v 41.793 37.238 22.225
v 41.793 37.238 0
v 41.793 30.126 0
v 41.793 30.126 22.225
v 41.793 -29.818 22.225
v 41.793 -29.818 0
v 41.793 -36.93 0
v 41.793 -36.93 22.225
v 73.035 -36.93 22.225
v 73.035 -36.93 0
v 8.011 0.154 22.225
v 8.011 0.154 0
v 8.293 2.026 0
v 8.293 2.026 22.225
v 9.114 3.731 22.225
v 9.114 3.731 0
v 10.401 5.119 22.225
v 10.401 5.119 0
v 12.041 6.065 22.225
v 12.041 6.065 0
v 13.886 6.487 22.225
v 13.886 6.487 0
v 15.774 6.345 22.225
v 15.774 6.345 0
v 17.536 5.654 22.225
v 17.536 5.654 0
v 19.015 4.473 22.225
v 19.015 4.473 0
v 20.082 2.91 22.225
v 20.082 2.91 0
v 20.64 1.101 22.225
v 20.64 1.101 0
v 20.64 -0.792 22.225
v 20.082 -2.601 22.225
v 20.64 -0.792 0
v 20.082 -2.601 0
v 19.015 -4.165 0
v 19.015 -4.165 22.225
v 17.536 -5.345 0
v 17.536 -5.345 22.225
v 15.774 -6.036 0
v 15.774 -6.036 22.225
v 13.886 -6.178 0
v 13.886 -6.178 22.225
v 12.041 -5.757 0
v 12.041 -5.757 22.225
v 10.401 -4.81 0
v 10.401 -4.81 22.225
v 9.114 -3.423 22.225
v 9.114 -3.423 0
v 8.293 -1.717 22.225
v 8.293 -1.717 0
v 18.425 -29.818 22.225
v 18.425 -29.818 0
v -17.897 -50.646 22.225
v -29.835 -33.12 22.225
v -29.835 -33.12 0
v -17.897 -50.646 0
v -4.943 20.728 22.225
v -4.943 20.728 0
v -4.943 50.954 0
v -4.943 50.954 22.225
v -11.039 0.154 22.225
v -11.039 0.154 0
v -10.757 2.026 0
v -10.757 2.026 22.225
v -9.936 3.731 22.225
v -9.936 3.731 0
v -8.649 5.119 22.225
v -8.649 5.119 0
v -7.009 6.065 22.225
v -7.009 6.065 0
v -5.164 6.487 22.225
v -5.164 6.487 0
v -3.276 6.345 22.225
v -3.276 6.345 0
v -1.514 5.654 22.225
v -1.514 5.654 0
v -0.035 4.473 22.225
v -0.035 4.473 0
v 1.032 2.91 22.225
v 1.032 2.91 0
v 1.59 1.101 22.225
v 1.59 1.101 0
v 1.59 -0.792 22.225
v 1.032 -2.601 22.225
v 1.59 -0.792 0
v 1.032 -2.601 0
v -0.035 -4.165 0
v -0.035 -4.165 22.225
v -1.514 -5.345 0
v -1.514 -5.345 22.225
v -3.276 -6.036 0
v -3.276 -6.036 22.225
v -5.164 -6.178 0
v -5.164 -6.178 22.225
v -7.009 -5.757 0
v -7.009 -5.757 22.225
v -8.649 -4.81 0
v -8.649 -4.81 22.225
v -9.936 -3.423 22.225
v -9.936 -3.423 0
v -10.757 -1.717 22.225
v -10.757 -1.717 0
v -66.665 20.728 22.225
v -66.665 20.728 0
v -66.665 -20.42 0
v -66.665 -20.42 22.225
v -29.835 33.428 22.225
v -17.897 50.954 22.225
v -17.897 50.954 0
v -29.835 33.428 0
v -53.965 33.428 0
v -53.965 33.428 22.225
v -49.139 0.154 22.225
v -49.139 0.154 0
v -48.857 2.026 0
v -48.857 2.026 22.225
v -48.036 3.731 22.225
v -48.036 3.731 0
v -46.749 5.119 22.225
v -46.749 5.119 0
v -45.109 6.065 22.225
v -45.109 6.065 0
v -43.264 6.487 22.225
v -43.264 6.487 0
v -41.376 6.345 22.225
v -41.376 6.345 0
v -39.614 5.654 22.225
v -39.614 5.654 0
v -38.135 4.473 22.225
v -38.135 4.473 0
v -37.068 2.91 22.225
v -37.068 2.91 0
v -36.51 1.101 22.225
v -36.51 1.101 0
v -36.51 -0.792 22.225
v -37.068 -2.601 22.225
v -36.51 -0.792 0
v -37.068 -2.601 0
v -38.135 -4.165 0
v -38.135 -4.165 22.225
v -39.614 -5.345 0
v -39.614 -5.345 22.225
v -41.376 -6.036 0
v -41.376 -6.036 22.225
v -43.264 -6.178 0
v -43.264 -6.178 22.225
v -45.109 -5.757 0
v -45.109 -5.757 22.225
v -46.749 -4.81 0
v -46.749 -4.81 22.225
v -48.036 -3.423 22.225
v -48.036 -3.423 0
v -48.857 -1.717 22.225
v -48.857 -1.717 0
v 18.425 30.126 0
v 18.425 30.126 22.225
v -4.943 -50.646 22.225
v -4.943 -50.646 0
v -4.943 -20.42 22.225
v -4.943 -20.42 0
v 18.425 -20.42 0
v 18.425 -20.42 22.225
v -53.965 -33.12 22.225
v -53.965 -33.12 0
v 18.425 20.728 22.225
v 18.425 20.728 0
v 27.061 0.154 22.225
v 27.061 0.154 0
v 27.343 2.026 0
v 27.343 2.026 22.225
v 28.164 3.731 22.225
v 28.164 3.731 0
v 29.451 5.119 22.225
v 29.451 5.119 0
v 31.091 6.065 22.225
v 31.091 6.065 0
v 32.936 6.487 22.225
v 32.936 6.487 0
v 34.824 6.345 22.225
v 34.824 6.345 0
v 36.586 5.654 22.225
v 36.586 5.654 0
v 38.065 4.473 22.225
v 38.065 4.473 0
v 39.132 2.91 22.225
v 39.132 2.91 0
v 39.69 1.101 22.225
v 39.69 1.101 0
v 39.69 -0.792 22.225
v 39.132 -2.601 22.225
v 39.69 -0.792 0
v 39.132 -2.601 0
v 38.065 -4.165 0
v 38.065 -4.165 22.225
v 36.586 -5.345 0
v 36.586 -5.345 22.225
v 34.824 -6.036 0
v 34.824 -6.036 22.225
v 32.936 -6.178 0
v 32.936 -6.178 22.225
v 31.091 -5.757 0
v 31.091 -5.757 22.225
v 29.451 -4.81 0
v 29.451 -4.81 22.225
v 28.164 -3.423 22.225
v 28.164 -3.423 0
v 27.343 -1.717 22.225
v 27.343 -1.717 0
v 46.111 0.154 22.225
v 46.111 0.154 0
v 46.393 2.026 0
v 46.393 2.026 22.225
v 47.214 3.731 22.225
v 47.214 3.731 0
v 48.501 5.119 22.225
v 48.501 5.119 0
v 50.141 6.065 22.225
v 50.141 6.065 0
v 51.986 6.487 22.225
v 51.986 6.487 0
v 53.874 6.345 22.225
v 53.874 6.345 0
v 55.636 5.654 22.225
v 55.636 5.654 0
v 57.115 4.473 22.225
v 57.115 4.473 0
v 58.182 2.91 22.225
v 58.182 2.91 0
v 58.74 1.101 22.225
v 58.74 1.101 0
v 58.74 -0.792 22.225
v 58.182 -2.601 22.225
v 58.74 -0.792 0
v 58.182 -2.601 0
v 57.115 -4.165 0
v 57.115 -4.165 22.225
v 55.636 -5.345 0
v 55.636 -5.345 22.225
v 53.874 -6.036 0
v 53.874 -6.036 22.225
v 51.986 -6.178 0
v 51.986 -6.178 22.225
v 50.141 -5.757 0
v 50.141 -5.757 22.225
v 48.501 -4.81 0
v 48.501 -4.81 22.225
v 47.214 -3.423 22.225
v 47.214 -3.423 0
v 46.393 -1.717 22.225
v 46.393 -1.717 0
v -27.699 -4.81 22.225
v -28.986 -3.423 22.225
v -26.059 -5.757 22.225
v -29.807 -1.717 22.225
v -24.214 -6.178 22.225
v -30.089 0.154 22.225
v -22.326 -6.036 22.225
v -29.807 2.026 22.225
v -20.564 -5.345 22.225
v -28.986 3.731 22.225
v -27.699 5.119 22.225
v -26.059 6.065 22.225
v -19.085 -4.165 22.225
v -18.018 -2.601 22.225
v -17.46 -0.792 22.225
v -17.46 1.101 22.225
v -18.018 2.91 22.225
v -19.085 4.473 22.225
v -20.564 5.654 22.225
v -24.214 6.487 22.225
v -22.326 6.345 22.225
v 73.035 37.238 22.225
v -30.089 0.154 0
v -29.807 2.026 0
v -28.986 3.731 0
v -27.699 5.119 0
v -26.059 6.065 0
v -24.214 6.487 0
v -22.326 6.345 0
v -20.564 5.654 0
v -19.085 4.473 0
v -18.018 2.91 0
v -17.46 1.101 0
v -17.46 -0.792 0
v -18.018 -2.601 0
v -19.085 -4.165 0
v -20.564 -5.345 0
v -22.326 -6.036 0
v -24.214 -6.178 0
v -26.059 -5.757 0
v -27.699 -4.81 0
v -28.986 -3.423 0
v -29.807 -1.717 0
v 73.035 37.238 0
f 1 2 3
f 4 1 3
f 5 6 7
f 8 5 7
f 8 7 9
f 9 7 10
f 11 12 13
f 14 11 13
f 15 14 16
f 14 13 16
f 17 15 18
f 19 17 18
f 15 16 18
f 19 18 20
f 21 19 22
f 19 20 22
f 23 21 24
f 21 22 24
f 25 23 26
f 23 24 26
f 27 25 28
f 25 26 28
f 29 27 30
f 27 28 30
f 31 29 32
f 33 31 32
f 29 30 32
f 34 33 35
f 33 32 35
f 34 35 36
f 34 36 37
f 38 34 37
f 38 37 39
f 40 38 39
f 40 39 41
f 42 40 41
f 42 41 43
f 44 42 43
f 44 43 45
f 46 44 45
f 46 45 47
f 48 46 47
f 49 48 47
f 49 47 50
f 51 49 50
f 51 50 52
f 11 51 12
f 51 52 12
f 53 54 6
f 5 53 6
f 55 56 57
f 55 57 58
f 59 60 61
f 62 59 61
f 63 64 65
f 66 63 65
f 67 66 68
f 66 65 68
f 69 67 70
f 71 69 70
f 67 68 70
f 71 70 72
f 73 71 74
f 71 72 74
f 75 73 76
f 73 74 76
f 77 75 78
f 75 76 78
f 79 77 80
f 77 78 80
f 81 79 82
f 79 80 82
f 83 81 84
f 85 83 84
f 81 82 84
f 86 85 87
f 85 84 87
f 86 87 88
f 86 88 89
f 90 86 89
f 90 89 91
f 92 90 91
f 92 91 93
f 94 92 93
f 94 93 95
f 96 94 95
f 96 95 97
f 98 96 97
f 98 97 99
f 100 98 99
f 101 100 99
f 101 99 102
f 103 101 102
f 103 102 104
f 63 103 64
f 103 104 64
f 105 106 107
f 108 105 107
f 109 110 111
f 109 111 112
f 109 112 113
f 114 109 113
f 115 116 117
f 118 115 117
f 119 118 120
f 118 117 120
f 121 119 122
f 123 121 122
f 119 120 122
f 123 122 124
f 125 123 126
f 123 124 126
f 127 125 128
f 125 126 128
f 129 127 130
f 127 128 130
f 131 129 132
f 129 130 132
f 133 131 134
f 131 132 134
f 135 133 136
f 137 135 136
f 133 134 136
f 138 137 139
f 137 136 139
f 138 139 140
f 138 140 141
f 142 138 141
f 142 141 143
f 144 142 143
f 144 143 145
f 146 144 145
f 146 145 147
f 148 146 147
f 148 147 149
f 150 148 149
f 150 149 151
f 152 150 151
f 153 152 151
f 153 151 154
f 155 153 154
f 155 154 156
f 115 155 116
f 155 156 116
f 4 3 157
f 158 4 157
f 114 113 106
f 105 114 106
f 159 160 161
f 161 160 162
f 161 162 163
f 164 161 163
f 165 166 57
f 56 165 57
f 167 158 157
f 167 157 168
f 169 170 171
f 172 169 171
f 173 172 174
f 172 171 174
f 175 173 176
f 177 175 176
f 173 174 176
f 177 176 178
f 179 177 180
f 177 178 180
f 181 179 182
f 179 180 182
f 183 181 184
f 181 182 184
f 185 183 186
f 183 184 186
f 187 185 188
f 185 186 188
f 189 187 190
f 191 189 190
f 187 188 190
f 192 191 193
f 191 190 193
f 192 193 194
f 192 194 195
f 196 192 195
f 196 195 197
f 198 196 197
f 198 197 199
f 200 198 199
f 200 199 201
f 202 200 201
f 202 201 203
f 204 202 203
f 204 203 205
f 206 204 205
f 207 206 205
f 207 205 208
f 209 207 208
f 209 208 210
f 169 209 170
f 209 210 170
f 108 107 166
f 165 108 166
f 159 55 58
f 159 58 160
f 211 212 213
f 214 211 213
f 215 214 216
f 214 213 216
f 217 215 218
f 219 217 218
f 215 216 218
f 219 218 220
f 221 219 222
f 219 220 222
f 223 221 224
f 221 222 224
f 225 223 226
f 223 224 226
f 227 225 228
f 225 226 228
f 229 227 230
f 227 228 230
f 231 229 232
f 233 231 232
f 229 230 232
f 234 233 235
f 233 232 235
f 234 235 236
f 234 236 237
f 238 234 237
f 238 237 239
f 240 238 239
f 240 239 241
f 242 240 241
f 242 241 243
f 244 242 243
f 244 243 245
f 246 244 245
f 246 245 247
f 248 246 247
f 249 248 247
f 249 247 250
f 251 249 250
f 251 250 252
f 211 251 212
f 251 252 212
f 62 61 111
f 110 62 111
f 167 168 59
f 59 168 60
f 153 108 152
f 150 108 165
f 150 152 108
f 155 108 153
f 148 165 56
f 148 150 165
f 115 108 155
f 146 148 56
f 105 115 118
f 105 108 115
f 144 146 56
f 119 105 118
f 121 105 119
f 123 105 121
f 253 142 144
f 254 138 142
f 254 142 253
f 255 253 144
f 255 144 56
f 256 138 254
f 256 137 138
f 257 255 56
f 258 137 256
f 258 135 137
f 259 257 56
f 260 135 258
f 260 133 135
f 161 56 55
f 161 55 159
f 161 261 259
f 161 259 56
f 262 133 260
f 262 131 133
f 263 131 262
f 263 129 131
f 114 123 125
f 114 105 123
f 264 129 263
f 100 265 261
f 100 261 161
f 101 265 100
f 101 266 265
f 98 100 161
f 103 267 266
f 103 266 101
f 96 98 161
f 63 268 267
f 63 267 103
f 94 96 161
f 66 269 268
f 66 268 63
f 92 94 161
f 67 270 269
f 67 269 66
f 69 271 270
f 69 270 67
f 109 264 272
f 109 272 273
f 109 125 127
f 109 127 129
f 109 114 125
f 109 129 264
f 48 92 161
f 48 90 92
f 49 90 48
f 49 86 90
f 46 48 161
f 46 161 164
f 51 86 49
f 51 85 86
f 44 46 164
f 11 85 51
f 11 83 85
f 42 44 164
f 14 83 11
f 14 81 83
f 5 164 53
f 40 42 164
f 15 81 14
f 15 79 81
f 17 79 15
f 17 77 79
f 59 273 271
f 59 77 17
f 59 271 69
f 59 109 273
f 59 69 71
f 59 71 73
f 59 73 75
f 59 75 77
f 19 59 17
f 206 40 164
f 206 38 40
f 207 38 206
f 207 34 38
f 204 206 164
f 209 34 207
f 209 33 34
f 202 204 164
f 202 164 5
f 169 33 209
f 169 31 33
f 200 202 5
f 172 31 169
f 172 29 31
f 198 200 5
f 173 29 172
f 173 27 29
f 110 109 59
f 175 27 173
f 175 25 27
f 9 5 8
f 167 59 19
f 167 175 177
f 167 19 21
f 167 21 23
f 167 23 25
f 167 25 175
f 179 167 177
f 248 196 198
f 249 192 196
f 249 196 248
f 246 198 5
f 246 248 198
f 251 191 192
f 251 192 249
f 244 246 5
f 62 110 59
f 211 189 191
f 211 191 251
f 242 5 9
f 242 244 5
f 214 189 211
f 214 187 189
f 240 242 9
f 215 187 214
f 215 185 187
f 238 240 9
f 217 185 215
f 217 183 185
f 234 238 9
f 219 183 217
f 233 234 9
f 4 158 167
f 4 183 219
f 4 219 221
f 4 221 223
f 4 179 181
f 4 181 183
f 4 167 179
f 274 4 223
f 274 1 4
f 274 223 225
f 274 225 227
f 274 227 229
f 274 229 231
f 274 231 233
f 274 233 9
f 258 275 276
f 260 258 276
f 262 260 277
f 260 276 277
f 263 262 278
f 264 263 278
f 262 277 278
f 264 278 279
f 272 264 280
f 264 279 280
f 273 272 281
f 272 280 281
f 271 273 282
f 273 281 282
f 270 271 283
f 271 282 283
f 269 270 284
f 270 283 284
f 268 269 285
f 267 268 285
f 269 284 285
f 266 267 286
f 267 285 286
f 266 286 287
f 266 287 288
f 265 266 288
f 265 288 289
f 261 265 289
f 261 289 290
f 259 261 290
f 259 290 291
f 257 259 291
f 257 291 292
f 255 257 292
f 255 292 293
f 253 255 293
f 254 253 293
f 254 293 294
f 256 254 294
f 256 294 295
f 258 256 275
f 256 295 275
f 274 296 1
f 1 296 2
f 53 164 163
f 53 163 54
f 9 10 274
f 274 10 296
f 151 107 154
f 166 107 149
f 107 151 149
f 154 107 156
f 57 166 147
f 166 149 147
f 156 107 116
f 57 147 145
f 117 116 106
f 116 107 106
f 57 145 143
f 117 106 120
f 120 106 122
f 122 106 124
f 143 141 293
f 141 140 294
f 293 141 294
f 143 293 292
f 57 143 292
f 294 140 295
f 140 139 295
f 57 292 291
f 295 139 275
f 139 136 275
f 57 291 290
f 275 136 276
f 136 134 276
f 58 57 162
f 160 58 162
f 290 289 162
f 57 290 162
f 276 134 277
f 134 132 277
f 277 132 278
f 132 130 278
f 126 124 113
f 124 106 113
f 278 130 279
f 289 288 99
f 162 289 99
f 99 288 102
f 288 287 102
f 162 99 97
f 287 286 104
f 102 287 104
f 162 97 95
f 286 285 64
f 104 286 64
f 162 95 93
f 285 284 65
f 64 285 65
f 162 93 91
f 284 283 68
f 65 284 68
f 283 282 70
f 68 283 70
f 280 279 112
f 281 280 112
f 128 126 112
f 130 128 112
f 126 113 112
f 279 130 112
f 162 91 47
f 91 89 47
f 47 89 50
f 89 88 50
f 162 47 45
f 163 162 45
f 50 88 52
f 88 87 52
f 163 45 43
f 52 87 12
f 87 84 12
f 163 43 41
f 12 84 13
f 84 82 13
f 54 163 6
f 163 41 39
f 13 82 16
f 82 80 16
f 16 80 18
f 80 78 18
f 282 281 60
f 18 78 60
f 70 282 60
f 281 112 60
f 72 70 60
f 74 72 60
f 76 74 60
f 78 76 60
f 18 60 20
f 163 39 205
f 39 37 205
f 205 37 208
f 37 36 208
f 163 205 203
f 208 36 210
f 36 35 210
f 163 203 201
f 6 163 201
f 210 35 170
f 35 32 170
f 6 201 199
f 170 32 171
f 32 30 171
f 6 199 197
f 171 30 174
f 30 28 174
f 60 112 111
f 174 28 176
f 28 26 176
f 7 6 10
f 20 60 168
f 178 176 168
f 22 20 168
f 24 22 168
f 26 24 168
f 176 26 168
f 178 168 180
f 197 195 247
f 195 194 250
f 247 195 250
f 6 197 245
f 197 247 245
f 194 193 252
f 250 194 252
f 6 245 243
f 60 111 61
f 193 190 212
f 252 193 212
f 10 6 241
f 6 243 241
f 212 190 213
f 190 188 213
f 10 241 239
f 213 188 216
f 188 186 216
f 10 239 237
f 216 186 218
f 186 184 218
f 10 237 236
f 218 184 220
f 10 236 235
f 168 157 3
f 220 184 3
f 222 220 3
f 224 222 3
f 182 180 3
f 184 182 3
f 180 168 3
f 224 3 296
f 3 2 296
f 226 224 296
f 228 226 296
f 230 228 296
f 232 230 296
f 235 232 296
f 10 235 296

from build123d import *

# Parameters (mm, degrees)
BOSS_EXTRUDE1_DEPTH = 22.225


with BuildPart() as part:
    # Sketch4 → Boss-Extrude1 (new body)
    with BuildSketch(Plane.XY):
        with BuildLine():
            Line((-49.139399536, 0.154397006), (-66.665399536, 0.154397006))
            Line((-66.665399536, 0.154397006), (-66.665399536, -20.419602994))
            Line((-66.665399536, -20.419602994), (-53.965399536, -33.119602994))
            Line((-53.965399536, -33.119602994), (-29.835399536, -33.119602994))
            Line((-29.835399536, -33.119602994), (-17.897399536, -50.645602994))
            Line((-17.897399536, -50.645602994), (-4.943399536, -50.645602994))
            Line((-4.943399536, -50.645602994), (-4.943399536, -20.419602994))
            Line((-4.943399536, -20.419602994), (18.424600464, -20.419602994))
            Line((18.424600464, -20.419602994), (18.424600464, -29.817602994))
            Line((18.424600464, -29.817602994), (41.792600464, -29.817602994))
            Line((41.792600464, -29.817602994), (41.792600464, -36.929602994))
            Line((41.792600464, -36.929602994), (73.034600464, -36.929602994))
            Line((73.034600464, -36.929602994), (73.034600464, 0.154397006))
            Line((73.034600464, 0.154397006), (58.810600464, 0.154397006))
            ThreePointArc((58.810600464, 0.154397006), (52.460600464, -6.195602994), (46.110600464, 0.154397006))
            Line((46.110600464, 0.154397006), (39.760600464, 0.154397006))
            ThreePointArc((39.760600464, 0.154397006), (33.410600464, -6.195602994), (27.060600464, 0.154397006))
            Line((27.060600464, 0.154397006), (20.710600464, 0.154397006))
            ThreePointArc((20.710600464, 0.154397006), (14.360600464, -6.195602994), (8.010600464, 0.154397006))
            Line((8.010600464, 0.154397006), (1.660600464, 0.154397006))
            ThreePointArc((1.660600464, 0.154397006), (-4.689399536, -6.195602994), (-11.039399536, 0.154397006))
            Line((-11.039399536, 0.154397006), (-17.389399536, 0.154397006))
            ThreePointArc((-17.389399536, 0.154397006), (-23.739399536, -6.195602994), (-30.089399536, 0.154397006))
            Line((-30.089399536, 0.154397006), (-36.439399536, 0.154397006))
            ThreePointArc((-36.439399536, 0.154397006), (-42.789399536, -6.195602994), (-49.139399536, 0.154397006))
        make_face()
        with BuildLine():
            Line((-53.965399536, 33.428397006), (-66.665399536, 20.728397006))
            Line((-66.665399536, 20.728397006), (-66.665399536, 0.154397006))
            Line((-66.665399536, 0.154397006), (-49.139399536, 0.154397006))
            ThreePointArc((-49.139399536, 0.154397006), (-42.789399536, 6.504397006), (-36.439399536, 0.154397006))
            Line((-36.439399536, 0.154397006), (-30.089399536, 0.154397006))
            ThreePointArc((-30.089399536, 0.154397006), (-23.739399536, 6.504397006), (-17.389399536, 0.154397006))
            Line((-17.389399536, 0.154397006), (-11.039399536, 0.154397006))
            ThreePointArc((-11.039399536, 0.154397006), (-4.689399536, 6.504397006), (1.660600464, 0.154397006))
            Line((1.660600464, 0.154397006), (8.010600464, 0.154397006))
            ThreePointArc((8.010600464, 0.154397006), (14.360600464, 6.504397006), (20.710600464, 0.154397006))
            Line((20.710600464, 0.154397006), (27.060600464, 0.154397006))
            ThreePointArc((27.060600464, 0.154397006), (33.410600464, 6.504397006), (39.760600464, 0.154397006))
            Line((39.760600464, 0.154397006), (46.110600464, 0.154397006))
            ThreePointArc((46.110600464, 0.154397006), (52.460600464, 6.504397006), (58.810600464, 0.154397006))
            Line((58.810600464, 0.154397006), (73.034600464, 0.154397006))
            Line((73.034600464, 0.154397006), (73.034600464, 37.238397006))
            Line((73.034600464, 37.238397006), (41.792600464, 37.238397006))
            Line((41.792600464, 37.238397006), (41.792600464, 30.126397006))
            Line((41.792600464, 30.126397006), (18.424600464, 30.126397006))
            Line((18.424600464, 30.126397006), (18.424600464, 20.728397006))
            Line((18.424600464, 20.728397006), (-4.943399536, 20.728397006))
            Line((-4.943399536, 20.728397006), (-4.943399536, 50.954397006))
            Line((-4.943399536, 50.954397006), (-17.897399536, 50.954397006))
            Line((-17.897399536, 50.954397006), (-29.835399536, 33.428397006))
            Line((-29.835399536, 33.428397006), (-53.965399536, 33.428397006))
        make_face()
    extrude(amount=BOSS_EXTRUDE1_DEPTH)


solid = part.part
